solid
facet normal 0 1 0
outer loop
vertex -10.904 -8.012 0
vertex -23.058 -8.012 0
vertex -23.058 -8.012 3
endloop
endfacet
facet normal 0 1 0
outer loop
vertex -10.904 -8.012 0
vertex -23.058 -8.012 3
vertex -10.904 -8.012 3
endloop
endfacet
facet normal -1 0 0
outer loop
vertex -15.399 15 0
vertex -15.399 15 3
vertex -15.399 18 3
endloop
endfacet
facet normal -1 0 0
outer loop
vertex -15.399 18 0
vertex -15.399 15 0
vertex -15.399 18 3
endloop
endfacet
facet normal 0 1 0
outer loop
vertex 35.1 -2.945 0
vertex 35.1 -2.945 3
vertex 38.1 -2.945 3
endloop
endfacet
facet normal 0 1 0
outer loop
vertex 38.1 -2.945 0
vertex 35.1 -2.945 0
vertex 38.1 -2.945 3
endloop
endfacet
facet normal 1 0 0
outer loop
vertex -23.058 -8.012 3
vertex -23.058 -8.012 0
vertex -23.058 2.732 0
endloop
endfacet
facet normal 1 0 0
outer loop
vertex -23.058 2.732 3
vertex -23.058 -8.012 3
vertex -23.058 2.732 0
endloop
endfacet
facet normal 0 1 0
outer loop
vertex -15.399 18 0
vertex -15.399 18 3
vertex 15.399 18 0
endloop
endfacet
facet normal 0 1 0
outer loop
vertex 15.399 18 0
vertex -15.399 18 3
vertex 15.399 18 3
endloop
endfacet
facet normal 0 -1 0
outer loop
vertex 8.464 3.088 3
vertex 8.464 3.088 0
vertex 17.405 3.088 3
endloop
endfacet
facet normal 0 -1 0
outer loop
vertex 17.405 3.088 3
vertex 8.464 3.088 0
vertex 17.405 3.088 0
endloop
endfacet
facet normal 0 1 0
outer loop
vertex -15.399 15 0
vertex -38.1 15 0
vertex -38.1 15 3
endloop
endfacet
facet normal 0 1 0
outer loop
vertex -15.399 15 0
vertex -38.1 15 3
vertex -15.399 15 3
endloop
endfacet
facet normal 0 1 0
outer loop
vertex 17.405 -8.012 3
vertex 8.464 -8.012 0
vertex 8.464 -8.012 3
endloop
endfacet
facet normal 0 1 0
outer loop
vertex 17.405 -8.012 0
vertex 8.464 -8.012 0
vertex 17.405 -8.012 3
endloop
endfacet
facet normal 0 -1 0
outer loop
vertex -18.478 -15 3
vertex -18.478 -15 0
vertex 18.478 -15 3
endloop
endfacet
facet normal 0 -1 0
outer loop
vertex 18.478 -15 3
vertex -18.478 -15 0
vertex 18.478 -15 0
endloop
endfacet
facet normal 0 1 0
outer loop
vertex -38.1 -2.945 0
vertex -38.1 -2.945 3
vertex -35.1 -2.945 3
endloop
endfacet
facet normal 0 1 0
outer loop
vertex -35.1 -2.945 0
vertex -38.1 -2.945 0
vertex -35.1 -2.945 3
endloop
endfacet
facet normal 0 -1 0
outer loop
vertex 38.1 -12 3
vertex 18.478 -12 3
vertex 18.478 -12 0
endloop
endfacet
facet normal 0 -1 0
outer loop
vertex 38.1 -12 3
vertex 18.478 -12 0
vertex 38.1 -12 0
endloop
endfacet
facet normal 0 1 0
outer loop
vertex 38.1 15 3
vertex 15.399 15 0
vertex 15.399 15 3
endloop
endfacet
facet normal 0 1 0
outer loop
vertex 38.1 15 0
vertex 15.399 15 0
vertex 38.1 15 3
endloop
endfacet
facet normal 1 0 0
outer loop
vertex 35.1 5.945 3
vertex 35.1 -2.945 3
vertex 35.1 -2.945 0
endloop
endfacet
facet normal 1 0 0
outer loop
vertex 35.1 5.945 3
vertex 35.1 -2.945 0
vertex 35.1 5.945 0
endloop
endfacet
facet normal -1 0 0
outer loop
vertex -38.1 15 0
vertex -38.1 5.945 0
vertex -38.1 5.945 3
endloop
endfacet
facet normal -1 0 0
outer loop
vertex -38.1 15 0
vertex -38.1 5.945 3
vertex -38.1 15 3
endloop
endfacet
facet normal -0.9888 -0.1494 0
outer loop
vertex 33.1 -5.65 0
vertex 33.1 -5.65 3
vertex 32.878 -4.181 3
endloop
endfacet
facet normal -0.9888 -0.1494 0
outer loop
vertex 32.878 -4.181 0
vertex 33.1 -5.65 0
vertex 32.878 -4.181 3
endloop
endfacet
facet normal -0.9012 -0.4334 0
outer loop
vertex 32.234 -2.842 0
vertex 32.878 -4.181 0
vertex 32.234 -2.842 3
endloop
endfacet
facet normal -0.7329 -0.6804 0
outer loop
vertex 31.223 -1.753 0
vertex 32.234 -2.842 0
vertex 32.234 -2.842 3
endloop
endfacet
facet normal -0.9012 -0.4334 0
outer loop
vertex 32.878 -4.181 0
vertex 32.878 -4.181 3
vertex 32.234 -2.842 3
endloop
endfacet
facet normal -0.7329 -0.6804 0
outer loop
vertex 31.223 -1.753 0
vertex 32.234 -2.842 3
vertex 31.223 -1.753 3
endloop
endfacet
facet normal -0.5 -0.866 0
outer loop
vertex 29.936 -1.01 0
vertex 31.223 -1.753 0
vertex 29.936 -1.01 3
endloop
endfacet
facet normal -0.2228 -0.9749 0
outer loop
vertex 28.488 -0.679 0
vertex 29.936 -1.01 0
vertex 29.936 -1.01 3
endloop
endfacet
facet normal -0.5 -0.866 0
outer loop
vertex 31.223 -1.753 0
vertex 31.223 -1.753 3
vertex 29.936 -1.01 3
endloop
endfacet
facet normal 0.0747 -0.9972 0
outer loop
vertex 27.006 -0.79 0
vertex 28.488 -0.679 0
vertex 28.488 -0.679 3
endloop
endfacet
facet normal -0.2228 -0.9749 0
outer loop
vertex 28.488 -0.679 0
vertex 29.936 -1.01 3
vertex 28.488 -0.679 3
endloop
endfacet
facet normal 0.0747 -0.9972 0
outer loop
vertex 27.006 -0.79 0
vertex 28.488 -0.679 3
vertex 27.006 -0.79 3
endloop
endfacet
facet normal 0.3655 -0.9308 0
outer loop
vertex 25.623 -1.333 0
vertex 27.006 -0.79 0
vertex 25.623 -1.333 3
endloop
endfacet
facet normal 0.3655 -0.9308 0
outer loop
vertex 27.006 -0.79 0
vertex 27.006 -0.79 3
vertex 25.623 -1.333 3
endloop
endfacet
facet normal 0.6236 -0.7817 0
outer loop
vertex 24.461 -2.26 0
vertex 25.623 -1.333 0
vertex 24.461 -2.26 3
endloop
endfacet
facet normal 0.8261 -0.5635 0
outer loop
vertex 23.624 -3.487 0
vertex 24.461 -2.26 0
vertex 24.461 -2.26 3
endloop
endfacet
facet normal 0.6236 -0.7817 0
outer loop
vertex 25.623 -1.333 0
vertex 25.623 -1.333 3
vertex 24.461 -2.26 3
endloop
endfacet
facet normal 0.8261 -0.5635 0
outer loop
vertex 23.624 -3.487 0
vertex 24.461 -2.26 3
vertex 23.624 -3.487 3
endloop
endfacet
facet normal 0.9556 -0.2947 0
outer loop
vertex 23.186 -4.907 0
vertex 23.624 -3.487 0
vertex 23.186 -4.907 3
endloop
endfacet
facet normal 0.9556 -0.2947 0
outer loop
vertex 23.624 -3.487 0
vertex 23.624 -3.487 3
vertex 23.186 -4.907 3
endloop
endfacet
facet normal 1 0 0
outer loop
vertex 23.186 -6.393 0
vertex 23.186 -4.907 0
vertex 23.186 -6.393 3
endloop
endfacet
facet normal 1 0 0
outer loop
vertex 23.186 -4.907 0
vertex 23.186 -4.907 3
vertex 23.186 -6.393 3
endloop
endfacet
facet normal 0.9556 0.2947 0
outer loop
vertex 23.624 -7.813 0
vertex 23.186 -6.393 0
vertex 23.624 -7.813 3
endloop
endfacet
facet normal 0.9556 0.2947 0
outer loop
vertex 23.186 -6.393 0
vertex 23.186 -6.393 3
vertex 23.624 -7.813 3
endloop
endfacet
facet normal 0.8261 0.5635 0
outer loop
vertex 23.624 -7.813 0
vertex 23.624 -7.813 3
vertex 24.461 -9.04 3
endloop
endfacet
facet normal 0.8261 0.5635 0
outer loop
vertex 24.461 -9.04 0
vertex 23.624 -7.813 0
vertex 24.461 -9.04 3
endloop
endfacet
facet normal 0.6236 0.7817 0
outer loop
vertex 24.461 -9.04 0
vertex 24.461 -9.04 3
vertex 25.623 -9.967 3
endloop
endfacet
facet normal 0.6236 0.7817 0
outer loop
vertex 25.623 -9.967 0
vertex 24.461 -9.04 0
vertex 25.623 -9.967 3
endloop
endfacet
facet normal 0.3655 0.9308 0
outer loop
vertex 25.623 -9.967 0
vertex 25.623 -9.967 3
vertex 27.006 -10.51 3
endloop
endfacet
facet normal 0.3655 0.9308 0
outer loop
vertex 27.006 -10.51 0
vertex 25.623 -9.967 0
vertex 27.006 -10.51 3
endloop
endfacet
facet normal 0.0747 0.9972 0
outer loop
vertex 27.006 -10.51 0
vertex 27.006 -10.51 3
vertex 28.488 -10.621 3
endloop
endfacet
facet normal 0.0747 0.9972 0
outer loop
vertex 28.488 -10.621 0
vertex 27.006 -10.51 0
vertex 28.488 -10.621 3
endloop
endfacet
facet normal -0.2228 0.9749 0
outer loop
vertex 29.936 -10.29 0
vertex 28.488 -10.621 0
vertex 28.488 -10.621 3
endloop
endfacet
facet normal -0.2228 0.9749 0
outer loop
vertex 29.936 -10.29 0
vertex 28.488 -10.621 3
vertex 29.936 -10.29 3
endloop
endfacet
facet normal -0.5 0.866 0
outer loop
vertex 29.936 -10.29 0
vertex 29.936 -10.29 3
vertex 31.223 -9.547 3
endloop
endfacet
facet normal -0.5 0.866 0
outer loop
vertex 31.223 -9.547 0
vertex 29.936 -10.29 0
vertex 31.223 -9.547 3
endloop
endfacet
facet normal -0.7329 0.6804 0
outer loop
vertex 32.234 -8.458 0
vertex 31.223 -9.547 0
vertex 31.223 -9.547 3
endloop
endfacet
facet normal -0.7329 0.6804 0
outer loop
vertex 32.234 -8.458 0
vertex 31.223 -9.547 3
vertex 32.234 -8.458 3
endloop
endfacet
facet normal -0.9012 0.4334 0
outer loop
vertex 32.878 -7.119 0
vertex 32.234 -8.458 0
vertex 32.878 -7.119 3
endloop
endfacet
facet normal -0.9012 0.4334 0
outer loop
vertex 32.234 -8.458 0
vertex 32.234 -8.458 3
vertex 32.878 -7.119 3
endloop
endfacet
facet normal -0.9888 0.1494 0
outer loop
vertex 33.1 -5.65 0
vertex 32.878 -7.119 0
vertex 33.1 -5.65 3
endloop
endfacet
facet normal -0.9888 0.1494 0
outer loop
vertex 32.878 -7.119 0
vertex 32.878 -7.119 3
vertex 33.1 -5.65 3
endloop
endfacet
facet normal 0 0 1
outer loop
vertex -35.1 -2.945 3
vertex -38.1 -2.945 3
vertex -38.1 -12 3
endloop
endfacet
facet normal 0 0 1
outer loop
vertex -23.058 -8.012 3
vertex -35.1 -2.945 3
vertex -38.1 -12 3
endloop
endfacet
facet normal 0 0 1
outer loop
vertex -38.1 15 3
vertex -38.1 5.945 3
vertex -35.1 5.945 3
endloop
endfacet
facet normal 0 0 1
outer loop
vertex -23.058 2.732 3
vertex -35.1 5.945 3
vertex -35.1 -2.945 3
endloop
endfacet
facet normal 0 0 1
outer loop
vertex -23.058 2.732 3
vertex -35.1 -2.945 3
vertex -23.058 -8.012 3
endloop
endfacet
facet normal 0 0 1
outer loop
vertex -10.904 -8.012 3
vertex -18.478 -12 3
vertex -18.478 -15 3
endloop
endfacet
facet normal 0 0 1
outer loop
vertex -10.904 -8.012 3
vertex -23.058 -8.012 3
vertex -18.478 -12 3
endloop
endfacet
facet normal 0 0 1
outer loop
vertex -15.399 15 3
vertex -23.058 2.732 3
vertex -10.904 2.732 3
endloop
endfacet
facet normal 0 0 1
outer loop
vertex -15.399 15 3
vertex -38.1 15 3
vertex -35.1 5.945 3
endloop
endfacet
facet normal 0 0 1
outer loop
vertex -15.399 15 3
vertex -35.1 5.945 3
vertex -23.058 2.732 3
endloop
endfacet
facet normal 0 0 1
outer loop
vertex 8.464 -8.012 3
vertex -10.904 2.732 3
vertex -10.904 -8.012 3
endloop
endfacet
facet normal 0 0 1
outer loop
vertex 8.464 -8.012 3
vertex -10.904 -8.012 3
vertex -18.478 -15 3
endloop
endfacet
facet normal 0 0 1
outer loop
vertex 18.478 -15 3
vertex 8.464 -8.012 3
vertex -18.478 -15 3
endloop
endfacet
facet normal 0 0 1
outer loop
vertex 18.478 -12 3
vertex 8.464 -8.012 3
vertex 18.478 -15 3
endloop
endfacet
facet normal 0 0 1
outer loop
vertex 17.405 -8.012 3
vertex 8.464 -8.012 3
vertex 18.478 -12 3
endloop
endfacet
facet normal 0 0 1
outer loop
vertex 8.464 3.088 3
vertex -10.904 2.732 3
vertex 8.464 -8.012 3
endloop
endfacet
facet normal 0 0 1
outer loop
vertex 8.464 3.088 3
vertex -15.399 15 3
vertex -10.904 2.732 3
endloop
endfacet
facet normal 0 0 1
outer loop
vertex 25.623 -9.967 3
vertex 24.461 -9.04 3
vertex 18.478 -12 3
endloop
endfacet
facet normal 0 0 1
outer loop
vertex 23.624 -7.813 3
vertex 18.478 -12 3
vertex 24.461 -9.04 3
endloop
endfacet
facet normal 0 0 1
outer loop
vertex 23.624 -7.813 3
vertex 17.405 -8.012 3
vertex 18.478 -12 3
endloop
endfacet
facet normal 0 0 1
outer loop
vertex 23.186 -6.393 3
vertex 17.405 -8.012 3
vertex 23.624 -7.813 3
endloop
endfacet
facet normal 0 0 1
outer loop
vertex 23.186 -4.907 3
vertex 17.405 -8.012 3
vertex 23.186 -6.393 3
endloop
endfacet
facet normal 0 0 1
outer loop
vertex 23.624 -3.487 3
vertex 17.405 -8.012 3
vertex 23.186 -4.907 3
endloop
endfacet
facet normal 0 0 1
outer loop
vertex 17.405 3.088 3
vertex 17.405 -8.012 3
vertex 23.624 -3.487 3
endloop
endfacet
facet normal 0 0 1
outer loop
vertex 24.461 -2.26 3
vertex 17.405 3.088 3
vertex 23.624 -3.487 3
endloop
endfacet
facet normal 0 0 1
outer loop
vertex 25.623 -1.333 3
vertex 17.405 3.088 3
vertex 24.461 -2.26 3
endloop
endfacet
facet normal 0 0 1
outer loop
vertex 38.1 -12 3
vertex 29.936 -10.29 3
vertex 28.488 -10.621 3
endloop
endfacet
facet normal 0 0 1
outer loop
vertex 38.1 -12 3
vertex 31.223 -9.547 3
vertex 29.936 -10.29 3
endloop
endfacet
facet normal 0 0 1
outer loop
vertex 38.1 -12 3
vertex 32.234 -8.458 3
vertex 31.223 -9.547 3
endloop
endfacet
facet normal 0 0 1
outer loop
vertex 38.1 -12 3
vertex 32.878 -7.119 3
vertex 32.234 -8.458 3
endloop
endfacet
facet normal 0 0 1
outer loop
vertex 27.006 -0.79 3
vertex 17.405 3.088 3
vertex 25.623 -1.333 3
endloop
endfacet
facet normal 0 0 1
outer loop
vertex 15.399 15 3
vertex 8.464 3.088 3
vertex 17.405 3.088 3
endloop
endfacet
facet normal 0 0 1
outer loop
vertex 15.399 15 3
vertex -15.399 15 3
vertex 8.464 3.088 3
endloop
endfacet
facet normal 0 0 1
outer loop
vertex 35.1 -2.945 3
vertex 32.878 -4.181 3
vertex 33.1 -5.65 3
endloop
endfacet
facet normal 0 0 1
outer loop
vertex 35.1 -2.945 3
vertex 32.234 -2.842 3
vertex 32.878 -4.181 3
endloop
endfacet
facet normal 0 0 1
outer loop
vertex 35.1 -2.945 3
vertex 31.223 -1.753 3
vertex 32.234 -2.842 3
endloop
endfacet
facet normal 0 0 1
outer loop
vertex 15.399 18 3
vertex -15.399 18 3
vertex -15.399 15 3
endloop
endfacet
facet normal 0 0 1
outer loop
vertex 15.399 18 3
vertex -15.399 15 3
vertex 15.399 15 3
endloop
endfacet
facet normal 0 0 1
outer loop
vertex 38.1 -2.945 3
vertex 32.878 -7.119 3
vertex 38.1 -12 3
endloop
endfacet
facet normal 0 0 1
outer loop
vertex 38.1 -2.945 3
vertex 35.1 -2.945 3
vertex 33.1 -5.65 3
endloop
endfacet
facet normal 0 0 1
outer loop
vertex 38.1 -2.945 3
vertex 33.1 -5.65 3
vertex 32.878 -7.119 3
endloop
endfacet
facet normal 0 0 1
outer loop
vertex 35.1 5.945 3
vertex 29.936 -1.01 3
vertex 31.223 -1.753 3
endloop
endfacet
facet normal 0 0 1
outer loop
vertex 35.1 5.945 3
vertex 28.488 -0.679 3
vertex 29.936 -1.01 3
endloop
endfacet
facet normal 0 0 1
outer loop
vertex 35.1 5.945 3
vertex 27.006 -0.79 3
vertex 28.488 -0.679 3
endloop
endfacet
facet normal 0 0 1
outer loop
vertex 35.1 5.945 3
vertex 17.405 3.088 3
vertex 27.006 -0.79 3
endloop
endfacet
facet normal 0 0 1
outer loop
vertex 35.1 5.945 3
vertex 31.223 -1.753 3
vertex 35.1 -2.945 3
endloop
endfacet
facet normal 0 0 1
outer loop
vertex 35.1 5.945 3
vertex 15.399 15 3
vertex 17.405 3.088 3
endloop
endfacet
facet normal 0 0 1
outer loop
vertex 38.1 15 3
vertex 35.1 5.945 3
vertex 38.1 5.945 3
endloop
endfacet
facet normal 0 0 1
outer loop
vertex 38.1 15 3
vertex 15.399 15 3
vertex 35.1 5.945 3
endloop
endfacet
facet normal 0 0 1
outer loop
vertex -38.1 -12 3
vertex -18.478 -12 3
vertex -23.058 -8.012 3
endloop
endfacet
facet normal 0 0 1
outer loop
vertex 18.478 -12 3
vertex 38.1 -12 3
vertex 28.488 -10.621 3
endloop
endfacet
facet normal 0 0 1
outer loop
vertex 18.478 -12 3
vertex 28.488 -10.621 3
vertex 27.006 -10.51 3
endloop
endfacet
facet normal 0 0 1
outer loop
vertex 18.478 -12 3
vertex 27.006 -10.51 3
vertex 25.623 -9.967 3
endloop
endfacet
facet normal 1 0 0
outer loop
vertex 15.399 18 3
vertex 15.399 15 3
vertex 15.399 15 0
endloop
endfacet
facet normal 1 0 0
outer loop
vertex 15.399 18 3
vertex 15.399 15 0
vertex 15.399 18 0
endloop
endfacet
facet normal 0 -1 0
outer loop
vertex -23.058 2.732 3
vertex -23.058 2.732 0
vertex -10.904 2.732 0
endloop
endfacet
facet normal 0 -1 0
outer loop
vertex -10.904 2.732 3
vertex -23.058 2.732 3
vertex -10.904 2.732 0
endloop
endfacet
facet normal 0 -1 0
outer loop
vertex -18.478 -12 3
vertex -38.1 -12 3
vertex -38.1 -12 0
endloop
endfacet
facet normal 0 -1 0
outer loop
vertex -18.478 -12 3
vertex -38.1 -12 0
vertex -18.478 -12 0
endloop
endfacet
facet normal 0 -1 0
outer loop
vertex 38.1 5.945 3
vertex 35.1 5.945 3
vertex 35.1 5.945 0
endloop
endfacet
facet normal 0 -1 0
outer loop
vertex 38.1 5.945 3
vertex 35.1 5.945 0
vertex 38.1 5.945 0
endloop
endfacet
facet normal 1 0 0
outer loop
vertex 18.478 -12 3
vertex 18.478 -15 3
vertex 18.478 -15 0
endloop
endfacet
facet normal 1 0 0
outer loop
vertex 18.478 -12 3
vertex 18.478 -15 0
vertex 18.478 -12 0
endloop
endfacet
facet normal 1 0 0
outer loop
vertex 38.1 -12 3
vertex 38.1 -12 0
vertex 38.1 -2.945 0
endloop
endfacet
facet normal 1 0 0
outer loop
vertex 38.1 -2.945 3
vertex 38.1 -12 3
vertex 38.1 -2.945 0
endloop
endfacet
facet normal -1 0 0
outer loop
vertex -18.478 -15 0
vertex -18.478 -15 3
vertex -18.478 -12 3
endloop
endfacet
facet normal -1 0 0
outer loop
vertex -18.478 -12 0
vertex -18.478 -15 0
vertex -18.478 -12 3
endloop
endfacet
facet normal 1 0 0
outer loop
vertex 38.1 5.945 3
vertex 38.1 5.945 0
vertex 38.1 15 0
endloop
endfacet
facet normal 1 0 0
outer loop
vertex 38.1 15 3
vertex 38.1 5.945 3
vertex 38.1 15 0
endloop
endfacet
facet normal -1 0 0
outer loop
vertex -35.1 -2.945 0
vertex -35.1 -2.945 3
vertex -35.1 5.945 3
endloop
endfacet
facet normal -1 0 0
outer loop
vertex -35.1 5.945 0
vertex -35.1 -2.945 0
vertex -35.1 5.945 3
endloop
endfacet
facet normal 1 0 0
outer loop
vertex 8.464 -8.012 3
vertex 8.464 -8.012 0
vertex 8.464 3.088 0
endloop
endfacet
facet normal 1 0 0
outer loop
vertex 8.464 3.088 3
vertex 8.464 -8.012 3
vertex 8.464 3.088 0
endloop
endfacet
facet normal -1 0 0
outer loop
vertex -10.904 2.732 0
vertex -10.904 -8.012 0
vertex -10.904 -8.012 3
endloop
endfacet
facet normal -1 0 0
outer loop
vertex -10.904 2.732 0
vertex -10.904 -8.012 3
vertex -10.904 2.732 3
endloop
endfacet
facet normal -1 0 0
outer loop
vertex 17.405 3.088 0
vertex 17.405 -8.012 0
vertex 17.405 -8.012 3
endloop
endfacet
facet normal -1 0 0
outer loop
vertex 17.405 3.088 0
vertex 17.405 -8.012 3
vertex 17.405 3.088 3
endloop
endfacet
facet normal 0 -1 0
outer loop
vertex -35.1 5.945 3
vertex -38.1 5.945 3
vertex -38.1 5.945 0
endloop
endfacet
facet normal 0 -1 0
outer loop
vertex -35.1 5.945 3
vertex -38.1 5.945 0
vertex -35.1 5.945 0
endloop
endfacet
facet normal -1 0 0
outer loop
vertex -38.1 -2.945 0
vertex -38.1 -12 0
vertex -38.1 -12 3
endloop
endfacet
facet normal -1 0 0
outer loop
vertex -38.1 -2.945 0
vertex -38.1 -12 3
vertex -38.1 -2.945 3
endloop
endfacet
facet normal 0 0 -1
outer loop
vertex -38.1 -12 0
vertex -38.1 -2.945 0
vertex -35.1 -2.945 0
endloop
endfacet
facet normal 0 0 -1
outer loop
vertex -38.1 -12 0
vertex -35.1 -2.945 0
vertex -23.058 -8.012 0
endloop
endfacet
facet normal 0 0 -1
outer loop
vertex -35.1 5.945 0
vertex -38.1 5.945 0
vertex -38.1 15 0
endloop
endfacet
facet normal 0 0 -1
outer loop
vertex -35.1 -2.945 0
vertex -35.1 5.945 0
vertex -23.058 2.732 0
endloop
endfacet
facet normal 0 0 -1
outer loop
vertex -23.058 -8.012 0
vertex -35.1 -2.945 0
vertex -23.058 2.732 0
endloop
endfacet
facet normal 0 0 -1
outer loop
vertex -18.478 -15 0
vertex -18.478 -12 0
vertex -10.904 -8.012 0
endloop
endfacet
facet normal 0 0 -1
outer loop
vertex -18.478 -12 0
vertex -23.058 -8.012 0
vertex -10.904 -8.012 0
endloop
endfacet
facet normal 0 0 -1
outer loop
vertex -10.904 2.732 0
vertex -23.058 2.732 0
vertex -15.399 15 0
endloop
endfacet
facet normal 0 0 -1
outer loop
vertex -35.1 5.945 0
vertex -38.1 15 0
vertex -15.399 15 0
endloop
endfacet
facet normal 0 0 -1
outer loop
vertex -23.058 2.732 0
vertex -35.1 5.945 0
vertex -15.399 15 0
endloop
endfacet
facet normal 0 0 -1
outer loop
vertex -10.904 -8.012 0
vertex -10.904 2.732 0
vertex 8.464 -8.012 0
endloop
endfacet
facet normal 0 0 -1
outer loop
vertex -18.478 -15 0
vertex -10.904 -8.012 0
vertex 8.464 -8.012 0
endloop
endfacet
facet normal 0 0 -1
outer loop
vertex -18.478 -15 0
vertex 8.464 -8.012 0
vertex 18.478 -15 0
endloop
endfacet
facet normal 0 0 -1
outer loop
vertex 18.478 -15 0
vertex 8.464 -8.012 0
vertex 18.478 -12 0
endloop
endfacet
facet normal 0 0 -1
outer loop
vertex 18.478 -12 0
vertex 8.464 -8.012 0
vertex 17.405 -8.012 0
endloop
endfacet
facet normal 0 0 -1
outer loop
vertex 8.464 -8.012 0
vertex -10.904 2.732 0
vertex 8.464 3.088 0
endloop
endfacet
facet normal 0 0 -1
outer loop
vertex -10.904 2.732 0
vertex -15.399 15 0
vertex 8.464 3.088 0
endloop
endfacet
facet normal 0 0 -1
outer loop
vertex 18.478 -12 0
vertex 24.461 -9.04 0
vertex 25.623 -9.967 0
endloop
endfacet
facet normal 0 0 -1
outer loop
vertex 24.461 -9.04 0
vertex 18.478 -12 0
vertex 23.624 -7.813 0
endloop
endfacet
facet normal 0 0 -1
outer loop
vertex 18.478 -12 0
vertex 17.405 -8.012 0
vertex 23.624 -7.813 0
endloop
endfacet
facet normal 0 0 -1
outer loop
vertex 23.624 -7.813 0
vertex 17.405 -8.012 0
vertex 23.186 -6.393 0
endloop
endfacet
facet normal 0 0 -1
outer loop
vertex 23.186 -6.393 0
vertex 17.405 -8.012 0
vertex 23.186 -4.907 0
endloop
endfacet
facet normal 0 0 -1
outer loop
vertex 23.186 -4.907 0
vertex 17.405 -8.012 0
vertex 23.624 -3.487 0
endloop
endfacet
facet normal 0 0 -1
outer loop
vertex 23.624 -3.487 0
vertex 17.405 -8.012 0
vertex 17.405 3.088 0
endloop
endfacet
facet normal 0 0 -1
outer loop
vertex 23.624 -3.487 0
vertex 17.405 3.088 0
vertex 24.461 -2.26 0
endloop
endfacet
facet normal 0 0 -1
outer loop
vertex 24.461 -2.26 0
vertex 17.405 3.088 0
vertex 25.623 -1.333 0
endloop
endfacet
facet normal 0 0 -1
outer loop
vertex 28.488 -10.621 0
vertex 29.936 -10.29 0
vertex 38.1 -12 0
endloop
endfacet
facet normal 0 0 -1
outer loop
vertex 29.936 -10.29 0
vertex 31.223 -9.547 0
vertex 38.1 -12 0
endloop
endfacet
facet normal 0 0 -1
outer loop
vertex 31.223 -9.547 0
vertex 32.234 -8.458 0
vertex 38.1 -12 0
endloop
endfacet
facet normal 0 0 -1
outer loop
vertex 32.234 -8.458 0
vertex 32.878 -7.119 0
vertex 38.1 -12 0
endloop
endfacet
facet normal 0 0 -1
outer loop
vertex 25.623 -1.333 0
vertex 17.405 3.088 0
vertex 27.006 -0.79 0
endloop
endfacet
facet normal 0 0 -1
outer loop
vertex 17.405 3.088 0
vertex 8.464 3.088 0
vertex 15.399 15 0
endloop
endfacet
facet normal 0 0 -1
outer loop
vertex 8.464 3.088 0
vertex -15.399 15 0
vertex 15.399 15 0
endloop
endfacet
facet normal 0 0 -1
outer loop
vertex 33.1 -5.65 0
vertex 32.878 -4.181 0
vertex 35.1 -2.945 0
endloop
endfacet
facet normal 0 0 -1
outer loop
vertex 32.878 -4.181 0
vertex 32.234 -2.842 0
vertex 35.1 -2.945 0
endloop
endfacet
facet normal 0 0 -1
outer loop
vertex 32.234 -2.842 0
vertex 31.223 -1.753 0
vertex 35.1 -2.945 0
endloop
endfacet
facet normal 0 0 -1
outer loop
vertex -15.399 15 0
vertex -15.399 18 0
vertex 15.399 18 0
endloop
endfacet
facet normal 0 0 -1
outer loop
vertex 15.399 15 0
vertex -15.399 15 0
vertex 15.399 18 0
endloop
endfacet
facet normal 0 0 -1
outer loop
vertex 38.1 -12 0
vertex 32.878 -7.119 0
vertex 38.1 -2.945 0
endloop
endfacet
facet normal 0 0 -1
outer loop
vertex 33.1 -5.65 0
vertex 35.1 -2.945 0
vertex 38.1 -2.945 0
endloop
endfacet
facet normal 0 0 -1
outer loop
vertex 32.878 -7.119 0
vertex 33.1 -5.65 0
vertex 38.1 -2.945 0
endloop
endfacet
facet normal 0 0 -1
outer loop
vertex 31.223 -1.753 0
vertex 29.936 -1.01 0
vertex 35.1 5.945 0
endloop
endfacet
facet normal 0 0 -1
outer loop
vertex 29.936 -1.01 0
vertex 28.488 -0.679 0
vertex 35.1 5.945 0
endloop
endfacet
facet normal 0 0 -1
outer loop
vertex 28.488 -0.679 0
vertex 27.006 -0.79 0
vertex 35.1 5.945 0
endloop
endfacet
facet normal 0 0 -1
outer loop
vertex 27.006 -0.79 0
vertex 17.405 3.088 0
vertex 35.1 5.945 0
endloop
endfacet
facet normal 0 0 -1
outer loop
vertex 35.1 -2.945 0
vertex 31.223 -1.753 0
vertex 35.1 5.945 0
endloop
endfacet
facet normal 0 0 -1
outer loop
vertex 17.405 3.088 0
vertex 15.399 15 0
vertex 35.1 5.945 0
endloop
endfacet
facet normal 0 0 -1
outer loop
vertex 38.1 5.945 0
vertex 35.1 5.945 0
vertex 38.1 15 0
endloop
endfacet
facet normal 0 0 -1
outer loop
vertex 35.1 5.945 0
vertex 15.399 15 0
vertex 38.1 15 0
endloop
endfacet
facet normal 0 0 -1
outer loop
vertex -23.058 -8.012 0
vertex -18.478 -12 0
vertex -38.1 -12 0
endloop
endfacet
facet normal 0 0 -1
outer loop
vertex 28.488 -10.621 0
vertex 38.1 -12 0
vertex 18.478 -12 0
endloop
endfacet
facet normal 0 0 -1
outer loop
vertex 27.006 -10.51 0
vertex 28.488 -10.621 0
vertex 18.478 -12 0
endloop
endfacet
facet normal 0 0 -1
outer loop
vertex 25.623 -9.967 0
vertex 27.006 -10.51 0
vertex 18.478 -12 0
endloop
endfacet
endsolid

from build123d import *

# Parameters (mm, degrees)
SKETCH_1_W          = 76.2
SKETCH_1_H          = 30
SKETCH_1_W_2        = 8.9408
SKETCH_1_H_2        = 11.0998
SKETCH_1_W_3        = 12.1539
SKETCH_1_H_3        = 10.7442
EXTRUDE_1_DEPTH     = 3
SKETCH_2_W          = 19.6215
SKETCH_2_H          = 3
CUT_EXTRUDE_1_DEPTH = 3
SKETCH_3_W          = 3
SKETCH_3_H          = 8.89
CUT_EXTRUDE_2_DEPTH = 3
SKETCH_4_W          = 30.7975
SKETCH_4_H          = 3
EXTRUDE_2_DEPTH     = 3
SKETCH_5_R          = 4.98475
CUT_EXTRUDE_3_DEPTH = 3


with BuildPart() as part:
    # 스케치1 → 보스-돌출1 (new body)
    with BuildSketch(Plane.XY):
        Rectangle(SKETCH_1_W, SKETCH_1_H)
        with Locations((12.9343, -2.4623)):
            Rectangle(SKETCH_1_W_2, SKETCH_1_H_2, mode=Mode.SUBTRACT)
        with Locations((-16.98055, -2.6401)):
            Rectangle(SKETCH_1_W_3, SKETCH_1_H_3, mode=Mode.SUBTRACT)
    extrude(amount=EXTRUDE_1_DEPTH)

    # 스케치2 → 컷-돌출1 (cut)
    with BuildSketch(Plane.XY.offset(3)):
        with Locations((-28.28925, -13.5)):
            Rectangle(SKETCH_2_W, SKETCH_2_H)
        with Locations((28.28925, -13.5)):
            Rectangle(SKETCH_2_W, SKETCH_2_H)
    extrude(amount=-CUT_EXTRUDE_1_DEPTH, mode=Mode.SUBTRACT)

    # 스케치3 → 컷-돌출2 (cut)
    with BuildSketch(Plane.XY.offset(3)):
        with Locations((-36.6, 1.5)):
            Rectangle(SKETCH_3_W, SKETCH_3_H)
        with Locations((36.6, 1.5)):
            Rectangle(SKETCH_3_W, SKETCH_3_H)
    extrude(amount=-CUT_EXTRUDE_2_DEPTH, mode=Mode.SUBTRACT)

    # 스케치4 → 보스-돌출2 (add)
    with BuildSketch(Plane.XY.offset(3)):
        with Locations((0, 16.5)):
            Rectangle(SKETCH_4_W, SKETCH_4_H)
    extrude(amount=-EXTRUDE_2_DEPTH)

    # 스케치5 → 컷-돌출3 (cut)
    with BuildSketch(Plane.XY.offset(3)):
        with Locations((28.115, -5.65)):
            Circle(SKETCH_5_R)
    extrude(amount=-CUT_EXTRUDE_3_DEPTH, mode=Mode.SUBTRACT)


solid = part.part
